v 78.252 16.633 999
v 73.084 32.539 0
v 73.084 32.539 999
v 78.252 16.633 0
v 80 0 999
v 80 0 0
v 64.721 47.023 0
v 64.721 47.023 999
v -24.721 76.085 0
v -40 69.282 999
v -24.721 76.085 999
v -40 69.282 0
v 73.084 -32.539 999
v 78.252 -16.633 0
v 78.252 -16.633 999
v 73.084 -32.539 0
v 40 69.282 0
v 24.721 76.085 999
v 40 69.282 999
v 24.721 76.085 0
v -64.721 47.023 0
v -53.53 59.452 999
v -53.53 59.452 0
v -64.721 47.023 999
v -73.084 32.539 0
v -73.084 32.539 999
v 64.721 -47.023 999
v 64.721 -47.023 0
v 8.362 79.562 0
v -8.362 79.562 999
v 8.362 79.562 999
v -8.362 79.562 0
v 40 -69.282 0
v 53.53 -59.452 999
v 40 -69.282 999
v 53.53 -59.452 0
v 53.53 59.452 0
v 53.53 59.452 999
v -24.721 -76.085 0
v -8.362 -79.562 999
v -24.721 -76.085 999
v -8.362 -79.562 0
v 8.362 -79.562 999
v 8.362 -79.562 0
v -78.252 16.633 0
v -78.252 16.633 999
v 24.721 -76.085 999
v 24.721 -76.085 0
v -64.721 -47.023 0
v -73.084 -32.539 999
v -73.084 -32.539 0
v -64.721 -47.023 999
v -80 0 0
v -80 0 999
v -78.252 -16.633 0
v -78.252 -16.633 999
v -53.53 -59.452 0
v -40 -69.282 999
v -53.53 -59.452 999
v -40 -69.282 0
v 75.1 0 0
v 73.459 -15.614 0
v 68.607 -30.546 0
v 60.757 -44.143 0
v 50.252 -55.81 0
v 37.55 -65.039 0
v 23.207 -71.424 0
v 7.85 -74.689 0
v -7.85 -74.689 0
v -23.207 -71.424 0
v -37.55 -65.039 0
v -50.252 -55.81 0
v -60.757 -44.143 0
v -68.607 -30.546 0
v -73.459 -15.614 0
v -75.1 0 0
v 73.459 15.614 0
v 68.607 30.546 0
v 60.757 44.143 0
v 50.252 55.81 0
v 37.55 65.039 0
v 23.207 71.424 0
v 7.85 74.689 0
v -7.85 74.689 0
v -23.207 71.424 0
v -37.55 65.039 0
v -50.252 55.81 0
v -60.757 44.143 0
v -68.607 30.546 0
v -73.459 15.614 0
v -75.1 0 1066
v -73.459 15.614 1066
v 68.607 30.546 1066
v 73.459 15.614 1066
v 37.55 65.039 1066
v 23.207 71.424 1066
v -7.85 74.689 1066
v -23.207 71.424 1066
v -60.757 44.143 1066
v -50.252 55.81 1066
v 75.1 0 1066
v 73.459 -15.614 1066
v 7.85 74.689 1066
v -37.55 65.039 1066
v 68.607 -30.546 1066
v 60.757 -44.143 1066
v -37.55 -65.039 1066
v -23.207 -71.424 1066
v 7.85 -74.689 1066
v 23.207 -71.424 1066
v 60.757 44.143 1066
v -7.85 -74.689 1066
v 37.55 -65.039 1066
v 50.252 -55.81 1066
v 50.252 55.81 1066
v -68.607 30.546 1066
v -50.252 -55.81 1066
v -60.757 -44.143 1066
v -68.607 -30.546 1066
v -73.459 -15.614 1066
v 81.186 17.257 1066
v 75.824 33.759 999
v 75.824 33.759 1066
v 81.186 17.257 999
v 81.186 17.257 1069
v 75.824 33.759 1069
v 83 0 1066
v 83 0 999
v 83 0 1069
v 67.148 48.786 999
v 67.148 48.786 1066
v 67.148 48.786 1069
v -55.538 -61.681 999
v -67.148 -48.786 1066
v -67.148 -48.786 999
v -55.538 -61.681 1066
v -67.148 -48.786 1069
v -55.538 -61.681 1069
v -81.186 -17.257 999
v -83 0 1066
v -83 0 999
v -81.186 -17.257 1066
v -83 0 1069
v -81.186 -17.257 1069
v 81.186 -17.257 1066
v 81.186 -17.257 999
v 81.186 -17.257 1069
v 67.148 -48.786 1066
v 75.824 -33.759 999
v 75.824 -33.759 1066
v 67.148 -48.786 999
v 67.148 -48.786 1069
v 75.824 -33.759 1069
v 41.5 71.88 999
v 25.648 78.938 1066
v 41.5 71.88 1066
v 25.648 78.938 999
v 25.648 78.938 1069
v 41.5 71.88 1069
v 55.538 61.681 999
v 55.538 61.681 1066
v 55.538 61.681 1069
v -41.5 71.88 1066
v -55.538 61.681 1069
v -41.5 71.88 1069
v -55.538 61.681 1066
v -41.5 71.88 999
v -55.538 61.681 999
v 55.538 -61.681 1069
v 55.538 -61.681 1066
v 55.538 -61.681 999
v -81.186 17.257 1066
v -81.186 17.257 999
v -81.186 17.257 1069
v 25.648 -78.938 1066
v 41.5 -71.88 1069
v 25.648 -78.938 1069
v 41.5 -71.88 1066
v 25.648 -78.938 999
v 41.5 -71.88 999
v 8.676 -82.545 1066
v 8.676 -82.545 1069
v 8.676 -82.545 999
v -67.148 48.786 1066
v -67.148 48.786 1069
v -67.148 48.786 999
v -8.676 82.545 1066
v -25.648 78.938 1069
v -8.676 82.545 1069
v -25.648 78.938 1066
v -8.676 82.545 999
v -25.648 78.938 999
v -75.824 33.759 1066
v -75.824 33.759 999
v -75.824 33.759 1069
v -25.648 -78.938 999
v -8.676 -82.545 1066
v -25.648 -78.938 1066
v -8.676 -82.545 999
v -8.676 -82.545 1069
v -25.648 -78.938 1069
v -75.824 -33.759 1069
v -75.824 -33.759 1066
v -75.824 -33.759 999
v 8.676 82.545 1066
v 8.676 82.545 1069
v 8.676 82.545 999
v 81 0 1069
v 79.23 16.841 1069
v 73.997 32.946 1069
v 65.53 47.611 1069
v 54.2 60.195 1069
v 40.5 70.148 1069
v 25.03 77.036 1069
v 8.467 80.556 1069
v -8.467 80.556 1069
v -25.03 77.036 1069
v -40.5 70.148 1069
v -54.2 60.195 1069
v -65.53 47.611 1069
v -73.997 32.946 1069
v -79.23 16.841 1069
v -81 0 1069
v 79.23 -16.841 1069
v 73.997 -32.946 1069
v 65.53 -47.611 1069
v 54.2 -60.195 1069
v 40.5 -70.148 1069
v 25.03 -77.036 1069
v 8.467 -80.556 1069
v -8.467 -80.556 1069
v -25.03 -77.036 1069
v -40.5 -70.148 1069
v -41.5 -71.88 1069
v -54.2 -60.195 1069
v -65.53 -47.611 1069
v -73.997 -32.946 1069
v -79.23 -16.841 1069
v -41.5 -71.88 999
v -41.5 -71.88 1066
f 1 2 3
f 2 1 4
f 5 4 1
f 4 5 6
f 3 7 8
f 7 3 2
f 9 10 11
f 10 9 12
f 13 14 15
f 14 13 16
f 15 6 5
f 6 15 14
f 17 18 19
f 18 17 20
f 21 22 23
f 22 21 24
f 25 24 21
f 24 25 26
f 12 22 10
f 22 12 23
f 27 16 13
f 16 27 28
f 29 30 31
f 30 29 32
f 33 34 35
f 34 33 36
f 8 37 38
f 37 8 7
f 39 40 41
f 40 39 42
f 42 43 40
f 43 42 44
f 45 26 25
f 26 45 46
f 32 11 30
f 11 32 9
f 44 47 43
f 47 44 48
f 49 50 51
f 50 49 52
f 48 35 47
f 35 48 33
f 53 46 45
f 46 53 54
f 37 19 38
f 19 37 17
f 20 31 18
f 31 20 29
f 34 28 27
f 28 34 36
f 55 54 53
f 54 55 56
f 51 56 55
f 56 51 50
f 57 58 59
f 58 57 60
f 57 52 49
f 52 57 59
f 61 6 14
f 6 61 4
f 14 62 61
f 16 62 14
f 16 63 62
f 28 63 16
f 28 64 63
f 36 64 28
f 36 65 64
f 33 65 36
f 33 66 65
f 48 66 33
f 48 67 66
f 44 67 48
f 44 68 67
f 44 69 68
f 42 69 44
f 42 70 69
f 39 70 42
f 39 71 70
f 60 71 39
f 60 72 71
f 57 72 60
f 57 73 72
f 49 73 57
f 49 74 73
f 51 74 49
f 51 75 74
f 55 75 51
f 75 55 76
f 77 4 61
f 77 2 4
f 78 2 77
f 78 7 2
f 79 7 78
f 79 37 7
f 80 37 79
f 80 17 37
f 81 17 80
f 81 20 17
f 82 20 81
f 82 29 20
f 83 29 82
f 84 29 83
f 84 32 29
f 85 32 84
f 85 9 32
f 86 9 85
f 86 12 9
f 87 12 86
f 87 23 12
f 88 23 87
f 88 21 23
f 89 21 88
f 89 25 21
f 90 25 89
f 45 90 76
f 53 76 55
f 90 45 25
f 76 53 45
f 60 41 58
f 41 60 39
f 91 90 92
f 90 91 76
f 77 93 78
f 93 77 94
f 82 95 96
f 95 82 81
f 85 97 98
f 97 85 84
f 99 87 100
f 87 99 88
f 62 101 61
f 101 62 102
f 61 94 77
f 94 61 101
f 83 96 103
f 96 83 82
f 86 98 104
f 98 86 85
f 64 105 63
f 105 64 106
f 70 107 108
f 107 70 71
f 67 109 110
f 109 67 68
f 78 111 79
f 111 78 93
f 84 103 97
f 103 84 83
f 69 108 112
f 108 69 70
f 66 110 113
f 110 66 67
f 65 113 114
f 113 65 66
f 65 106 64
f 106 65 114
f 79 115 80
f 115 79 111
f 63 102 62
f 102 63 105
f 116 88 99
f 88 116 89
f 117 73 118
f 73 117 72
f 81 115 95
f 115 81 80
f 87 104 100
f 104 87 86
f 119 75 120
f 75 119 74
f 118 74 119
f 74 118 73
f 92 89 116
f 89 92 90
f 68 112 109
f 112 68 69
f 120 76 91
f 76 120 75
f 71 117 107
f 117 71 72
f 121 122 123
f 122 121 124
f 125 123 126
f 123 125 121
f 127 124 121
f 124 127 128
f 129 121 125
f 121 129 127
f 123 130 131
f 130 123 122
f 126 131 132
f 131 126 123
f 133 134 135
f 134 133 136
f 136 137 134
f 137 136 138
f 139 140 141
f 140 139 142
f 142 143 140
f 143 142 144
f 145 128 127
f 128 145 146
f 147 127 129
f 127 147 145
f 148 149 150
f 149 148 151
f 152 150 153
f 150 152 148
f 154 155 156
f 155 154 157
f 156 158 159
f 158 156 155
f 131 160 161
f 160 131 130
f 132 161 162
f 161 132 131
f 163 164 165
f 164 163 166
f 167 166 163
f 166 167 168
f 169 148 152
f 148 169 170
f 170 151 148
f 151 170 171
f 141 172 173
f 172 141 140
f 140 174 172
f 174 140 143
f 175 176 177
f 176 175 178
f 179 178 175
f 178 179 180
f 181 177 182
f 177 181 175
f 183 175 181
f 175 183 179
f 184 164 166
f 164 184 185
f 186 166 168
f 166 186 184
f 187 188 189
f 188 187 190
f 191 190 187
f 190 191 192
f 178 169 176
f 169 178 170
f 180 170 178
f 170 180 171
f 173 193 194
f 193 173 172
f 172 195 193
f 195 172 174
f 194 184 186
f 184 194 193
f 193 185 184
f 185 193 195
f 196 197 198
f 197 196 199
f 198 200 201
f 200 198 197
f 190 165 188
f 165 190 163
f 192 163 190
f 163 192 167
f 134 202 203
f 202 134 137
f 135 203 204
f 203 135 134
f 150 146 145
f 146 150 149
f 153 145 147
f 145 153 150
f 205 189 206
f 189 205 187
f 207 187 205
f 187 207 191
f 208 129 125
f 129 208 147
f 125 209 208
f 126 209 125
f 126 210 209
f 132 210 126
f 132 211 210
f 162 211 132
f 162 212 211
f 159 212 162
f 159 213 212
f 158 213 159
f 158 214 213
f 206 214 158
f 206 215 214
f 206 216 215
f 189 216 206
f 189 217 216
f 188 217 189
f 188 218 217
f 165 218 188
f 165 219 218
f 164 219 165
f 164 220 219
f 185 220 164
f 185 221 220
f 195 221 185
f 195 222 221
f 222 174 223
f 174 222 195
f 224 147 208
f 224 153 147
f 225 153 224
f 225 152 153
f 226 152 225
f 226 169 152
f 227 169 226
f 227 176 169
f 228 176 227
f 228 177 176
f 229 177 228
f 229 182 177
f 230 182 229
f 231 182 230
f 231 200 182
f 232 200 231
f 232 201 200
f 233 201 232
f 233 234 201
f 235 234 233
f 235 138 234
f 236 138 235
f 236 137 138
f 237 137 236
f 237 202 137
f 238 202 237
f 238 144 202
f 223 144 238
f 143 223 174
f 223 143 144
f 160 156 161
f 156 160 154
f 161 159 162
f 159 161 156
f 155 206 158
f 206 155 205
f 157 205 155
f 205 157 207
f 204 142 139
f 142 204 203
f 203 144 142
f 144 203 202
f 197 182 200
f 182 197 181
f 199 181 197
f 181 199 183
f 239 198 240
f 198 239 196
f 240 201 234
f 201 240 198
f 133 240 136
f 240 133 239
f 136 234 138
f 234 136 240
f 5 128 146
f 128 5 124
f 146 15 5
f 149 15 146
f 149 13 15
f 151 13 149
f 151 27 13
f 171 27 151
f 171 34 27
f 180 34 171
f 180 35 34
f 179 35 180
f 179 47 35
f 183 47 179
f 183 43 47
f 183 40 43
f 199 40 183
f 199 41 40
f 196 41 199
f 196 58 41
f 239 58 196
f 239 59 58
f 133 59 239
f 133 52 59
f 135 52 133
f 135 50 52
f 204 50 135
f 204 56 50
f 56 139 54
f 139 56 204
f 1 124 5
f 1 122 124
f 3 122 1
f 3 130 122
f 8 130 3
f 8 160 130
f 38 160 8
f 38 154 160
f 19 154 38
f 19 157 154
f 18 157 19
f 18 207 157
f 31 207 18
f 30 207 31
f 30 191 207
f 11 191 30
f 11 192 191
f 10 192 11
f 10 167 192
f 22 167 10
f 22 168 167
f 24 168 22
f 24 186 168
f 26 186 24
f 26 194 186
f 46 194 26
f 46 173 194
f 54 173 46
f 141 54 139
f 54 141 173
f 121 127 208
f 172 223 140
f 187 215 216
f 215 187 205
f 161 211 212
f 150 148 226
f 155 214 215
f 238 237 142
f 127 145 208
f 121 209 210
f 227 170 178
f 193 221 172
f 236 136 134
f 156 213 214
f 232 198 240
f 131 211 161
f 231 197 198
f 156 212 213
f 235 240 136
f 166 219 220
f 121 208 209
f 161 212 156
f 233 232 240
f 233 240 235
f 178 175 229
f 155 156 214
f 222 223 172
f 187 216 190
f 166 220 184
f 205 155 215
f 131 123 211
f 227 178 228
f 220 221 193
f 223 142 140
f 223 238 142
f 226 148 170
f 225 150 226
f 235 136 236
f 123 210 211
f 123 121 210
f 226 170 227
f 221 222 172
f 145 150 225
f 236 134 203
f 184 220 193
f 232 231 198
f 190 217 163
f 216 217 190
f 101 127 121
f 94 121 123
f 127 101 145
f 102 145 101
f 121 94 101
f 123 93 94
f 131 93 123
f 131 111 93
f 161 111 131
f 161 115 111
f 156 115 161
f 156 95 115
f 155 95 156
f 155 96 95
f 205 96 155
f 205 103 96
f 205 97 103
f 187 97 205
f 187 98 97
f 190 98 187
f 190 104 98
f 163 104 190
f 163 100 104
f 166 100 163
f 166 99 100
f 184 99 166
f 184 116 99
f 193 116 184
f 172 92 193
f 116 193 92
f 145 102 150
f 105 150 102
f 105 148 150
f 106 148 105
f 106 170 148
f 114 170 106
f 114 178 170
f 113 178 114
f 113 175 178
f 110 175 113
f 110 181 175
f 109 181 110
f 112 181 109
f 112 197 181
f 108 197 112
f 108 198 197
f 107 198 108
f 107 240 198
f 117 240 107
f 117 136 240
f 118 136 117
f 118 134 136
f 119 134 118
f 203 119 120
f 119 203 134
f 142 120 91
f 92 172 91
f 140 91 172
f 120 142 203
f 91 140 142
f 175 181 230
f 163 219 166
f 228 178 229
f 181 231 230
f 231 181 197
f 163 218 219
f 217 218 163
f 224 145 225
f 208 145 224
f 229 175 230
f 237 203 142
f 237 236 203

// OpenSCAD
// Parameters
pipe_standard = 1; //[1:1:1]
nominal_diameter_mm = 160; //[80:320:1]
length_mm = 1000; //[500:2000:10]
include_end_fitting = 1; //[0:1:1]
wall_thickness_mm = 4.9; //[2.5:10:0.1]
fit_overlap_mm = 1; //[0.5:2:0.1]
socket_length_mm = 70; //[35:140:1]
socket_wall_extra_mm = 2.5; //[1:6:0.1]
socket_od_extra_mm = 6; //[2:16:0.5]
chamfer_height_mm = 3; //[1:8:0.5]
chamfer_radial_mm = 2; //[0.5:6:0.5]

// Module for the HT Pipe
module ht_pipe() {
  color([0.85, 0.85, 0.8]) {
    // Hollow tube body
    difference() {
      translate([0, 0, 0])
        cylinder(h=length_mm, r=nominal_diameter_mm/2, center=false);
      translate([0, 0, -fit_overlap_mm])
        cylinder(h=length_mm + fit_overlap_mm, r=nominal_diameter_mm/2 - wall_thickness_mm, center=false);
    }
    
    // End fitting detail
    if (include_end_fitting) {
      difference() {
        translate([0, 0, length_mm - fit_overlap_mm])
          cylinder(h=socket_length_mm, r=nominal_diameter_mm/2 + socket_od_extra_mm/2, center=false);
        translate([0, 0, length_mm - fit_overlap_mm])
          cylinder(h=socket_length_mm + fit_overlap_mm, r=nominal_diameter_mm/2 - wall_thickness_mm, center=false);
        translate([0, 0, length_mm - fit_overlap_mm + socket_length_mm - chamfer_height_mm])
          cylinder(h=chamfer_height_mm, r1=nominal_diameter_mm/2 + socket_od_extra_mm/2, r2=nominal_diameter_mm/2 + socket_od_extra_mm/2 - chamfer_radial_mm, center=false);
      }
    }
  }
}

// Assembly
module assembly() {
  ht_pipe();
}

assembly();
